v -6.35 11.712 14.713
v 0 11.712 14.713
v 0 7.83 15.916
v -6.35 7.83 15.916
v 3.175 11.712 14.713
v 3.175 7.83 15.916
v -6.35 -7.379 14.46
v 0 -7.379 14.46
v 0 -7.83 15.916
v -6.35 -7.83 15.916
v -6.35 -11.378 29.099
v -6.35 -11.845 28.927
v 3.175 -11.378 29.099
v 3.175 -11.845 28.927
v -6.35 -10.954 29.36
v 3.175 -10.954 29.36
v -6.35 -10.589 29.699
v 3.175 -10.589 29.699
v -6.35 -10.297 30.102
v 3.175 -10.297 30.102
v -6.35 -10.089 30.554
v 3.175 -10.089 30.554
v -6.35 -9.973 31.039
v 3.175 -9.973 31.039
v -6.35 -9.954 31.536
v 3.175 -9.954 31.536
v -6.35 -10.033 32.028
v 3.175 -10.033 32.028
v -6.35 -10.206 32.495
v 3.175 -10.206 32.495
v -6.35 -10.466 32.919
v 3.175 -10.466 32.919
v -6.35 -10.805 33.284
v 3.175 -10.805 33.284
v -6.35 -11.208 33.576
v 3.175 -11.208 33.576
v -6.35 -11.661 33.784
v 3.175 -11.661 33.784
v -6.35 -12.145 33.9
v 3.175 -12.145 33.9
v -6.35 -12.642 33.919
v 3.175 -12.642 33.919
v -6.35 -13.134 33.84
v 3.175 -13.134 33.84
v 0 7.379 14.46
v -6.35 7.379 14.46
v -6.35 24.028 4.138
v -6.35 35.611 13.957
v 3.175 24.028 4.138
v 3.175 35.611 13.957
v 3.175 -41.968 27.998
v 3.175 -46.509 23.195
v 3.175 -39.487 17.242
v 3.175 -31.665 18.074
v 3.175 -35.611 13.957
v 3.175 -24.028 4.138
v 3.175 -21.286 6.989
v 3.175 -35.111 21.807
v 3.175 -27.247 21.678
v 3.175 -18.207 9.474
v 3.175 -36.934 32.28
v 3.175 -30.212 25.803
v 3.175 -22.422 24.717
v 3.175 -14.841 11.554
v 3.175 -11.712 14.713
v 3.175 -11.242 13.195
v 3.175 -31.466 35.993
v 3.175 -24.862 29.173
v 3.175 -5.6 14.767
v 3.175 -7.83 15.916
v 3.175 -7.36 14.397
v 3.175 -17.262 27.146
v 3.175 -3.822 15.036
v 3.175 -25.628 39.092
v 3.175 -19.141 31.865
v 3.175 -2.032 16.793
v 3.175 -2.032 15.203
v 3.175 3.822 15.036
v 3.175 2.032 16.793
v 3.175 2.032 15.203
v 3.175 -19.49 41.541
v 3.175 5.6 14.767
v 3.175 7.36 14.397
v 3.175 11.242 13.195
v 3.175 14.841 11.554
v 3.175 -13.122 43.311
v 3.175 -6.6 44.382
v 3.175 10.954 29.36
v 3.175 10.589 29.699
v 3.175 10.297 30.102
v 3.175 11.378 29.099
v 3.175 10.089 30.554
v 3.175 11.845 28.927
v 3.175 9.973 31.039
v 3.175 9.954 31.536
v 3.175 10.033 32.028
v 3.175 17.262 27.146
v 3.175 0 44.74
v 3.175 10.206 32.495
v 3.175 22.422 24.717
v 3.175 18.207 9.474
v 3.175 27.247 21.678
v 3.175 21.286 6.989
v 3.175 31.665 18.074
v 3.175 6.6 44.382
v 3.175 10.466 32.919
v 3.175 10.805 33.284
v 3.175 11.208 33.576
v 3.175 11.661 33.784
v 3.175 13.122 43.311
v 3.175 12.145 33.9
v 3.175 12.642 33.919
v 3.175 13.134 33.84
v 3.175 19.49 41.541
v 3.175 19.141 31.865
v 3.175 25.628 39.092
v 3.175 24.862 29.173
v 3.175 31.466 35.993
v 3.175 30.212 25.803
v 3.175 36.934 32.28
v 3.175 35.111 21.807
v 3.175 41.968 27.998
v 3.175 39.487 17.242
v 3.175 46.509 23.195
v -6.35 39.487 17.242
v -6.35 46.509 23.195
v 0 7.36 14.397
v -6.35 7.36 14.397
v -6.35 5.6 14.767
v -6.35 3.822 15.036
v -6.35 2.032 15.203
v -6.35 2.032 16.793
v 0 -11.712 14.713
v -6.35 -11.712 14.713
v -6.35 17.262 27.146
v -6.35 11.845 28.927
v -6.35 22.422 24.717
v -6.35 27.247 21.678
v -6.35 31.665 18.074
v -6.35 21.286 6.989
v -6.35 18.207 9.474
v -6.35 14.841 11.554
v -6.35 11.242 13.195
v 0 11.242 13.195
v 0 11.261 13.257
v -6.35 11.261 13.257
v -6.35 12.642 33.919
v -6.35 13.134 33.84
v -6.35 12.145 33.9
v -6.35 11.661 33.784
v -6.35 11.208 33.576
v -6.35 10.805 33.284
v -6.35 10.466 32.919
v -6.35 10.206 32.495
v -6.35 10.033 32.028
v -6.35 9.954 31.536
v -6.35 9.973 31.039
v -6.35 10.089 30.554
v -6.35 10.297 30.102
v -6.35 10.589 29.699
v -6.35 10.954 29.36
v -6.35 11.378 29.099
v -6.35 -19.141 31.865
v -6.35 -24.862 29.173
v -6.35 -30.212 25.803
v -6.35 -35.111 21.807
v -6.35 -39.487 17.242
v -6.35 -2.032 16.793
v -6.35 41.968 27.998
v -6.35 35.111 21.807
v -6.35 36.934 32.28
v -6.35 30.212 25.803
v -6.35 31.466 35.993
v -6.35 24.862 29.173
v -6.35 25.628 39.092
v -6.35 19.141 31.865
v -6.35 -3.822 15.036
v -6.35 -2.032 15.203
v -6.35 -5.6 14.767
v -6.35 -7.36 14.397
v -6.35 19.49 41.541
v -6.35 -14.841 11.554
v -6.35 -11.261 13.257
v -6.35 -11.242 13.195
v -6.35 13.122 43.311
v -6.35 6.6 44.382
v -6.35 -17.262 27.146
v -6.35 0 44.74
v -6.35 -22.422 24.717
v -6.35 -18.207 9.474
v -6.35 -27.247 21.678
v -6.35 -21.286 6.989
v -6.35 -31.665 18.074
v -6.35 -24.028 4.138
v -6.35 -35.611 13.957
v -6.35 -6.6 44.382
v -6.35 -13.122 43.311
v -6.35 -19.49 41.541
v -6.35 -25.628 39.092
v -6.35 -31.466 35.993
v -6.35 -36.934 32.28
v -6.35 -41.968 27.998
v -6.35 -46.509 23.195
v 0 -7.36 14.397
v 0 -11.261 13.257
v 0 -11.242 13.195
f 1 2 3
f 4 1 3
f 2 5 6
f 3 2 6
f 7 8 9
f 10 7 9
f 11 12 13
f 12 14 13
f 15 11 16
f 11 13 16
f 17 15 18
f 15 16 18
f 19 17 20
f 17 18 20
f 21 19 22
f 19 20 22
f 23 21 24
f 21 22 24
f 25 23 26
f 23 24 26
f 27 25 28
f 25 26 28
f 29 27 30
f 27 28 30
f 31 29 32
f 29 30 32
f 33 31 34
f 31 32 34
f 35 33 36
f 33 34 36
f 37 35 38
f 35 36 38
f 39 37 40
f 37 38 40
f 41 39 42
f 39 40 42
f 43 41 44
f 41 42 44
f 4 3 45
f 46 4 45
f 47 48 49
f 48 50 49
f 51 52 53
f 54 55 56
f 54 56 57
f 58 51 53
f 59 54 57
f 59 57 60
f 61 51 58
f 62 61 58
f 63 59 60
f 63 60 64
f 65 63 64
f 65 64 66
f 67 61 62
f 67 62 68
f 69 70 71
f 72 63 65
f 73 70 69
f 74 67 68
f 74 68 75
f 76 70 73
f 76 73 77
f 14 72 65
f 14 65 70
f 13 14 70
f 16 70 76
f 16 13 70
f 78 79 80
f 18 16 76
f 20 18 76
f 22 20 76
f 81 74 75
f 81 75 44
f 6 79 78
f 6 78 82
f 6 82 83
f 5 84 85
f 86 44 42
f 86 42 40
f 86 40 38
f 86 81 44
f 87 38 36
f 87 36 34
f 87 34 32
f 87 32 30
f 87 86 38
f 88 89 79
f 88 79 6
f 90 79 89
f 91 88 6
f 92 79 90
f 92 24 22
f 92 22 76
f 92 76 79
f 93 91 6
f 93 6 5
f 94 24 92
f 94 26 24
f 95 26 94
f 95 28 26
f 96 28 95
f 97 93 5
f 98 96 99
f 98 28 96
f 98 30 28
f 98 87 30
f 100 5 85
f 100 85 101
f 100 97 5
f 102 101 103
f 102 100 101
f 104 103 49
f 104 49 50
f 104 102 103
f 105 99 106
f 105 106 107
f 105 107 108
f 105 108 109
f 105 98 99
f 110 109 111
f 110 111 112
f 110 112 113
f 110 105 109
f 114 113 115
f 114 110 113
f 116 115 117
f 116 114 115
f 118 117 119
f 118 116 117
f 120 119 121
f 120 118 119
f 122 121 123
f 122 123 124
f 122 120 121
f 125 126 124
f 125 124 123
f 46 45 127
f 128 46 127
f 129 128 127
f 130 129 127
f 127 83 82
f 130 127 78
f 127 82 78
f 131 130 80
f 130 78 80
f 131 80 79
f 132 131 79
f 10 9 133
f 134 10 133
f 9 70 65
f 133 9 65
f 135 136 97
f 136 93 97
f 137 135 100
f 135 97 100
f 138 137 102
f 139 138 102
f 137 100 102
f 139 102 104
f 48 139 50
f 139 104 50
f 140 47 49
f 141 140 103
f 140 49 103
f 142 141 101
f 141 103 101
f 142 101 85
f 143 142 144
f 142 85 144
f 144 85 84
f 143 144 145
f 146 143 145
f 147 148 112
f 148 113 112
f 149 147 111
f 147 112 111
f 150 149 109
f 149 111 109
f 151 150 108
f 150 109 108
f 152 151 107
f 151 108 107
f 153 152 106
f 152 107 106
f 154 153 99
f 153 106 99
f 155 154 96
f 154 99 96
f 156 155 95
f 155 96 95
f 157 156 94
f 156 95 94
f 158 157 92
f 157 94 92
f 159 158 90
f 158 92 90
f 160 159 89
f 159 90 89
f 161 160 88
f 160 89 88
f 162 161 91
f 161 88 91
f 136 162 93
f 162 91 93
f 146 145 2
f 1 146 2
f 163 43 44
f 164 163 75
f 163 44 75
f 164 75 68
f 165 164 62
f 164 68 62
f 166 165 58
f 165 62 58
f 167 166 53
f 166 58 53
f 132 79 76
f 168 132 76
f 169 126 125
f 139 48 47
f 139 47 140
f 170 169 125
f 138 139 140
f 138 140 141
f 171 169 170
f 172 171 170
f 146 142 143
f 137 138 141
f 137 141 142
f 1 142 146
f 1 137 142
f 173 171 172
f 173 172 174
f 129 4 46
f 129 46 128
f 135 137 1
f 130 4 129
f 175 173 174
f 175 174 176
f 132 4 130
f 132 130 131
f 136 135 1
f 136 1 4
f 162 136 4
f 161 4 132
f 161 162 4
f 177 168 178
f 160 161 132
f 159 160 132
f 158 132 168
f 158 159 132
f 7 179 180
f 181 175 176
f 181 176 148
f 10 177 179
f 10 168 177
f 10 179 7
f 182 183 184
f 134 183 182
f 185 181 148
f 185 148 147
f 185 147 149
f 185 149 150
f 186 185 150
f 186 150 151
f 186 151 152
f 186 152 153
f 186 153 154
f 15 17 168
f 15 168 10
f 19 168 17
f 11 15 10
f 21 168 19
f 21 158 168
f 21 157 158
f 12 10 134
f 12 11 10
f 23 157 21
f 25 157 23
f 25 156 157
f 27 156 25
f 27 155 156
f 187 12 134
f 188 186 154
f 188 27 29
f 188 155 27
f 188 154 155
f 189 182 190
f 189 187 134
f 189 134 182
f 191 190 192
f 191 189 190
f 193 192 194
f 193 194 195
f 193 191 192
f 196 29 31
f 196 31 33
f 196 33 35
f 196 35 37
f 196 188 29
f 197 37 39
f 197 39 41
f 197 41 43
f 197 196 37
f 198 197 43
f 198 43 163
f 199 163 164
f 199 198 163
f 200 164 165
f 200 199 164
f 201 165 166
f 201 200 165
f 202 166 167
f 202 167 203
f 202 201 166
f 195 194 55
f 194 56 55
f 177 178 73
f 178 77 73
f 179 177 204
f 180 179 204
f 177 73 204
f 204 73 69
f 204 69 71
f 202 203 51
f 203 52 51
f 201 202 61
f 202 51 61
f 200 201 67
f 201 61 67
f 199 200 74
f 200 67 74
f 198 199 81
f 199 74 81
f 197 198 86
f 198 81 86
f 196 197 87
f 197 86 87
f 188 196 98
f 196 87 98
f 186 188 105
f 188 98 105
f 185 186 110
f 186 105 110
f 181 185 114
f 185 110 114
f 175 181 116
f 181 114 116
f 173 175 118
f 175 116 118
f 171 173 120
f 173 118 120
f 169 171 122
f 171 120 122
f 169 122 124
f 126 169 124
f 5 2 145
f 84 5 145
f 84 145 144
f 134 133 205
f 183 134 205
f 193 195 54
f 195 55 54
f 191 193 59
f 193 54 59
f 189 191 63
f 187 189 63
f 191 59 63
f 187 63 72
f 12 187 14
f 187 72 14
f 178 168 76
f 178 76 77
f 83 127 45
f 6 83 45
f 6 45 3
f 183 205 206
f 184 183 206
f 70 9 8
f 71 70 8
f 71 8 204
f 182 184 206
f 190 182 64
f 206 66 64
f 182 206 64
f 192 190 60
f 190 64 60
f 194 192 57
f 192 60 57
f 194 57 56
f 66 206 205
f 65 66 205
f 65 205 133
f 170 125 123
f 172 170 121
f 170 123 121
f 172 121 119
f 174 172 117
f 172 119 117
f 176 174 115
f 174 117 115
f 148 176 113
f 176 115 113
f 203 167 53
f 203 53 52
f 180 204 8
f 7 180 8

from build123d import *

# Parameters (mm, degrees)
F1_DEPTH = 3.175
F3_DEPTH = 6.35


with BuildPart() as f1:
    # F0 (on Right) → F1 (new body)
    with BuildSketch(Plane.YZ):
        with BuildLine():
            ThreePointArc((11.2416642137, 13.194756409), (18.2070674879, 9.4741128861), (24.0282094439, 4.1379778313))
            Line((24.0282094439, 4.1379778313), (35.6114845565, 13.9572464754))
            ThreePointArc((35.6114845565, 13.9572464754), (24.8807782287, 23.2715946139), (11.8451676598, 28.9265036877))
            ThreePointArc((11.8451676598, 28.9265036877), (10.0327447326, 32.0278458379), (13.1340868829, 33.8402687651))
            ThreePointArc((13.1340868829, 33.8402687651), (27.588153444, 27.5700268215), (39.4865100795, 17.2421478736))
            Line((39.4865100795, 17.2421478736), (46.5087493001, 23.1949766478))
            ThreePointArc((46.5087493001, 23.1949766478), (0, 44.7400710849), (-46.5087493001, 23.1949766478))
            Line((-46.5087493001, 23.1949766478), (-39.4865100795, 17.2421478736))
            ThreePointArc((-39.4865100795, 17.2421478736), (-27.588153444, 27.5700268215), (-13.1340868829, 33.8402687651))
            ThreePointArc((-13.1340868829, 33.8402687651), (-10.0327447326, 32.0278458379), (-11.8451676598, 28.9265036877))
            ThreePointArc((-11.8451676598, 28.9265036877), (-24.8807782287, 23.2715946139), (-35.6114845565, 13.9572464754))
            Line((-35.6114845565, 13.9572464754), (-24.0282094439, 4.1379778313))
            ThreePointArc((-24.0282094439, 4.1379778313), (-18.2070674879, 9.4741128861), (-11.2416642137, 13.194756409))
            Line((-11.2416642137, 13.194756409), (-11.7119892349, 14.7131928424))
            Line((-11.7119892349, 14.7131928424), (-7.8299477766, 15.9156279202))
            Line((-7.8299477766, 15.9156279202), (-7.3596227555, 14.3971914867))
            ThreePointArc((-7.3596227555, 14.3971914867), (-4.7130812866, 14.9144174535), (-2.032, 15.2033942376))
            Line((-2.032, 15.2033942376), (-2.032, 16.7930026258))
            Line((-2.032, 16.7930026258), (2.032, 16.7930026258))
            Line((2.032, 16.7930026258), (2.032, 15.2033942376))
            ThreePointArc((2.032, 15.2033942376), (4.7130812866, 14.9144174535), (7.3596227555, 14.3971914867))
            Line((7.3596227555, 14.3971914867), (7.8299477766, 15.9156279202))
            Line((7.8299477766, 15.9156279202), (11.7119892349, 14.7131928424))
            Line((11.7119892349, 14.7131928424), (11.2416642137, 13.194756409))
        make_face()
    extrude(amount=F1_DEPTH)

    # F2 (on face) → F3 (join)
    with BuildSketch(Plane(origin=(0, 0, 0), x_dir=(0, -1, 0), z_dir=(-1, 0, 0))):
        with BuildLine():
            Line((-2.032, 16.7930026258), (2.032, 16.7930026258))
            Line((2.032, 16.7930026258), (2.032, 15.2690026258))
            Line((2.032, 15.2690026258), (2.032, 15.2033942376))
            ThreePointArc((2.032, 15.2033942376), (4.7130812866, 14.9144174535), (7.3596227555, 14.3971914867))
            Line((7.3596227555, 14.3971914867), (7.3790346224, 14.4598623733))
            Line((7.3790346224, 14.4598623733), (7.8299477766, 15.9156279202))
            Line((7.8299477766, 15.9156279202), (11.7119892349, 14.7131928424))
            Line((11.7119892349, 14.7131928424), (11.2610760807, 13.2574272956))
            Line((11.2610760807, 13.2574272956), (11.2416642137, 13.194756409))
            ThreePointArc((11.2416642137, 13.194756409), (18.2070674879, 9.4741128861), (24.0282094439, 4.1379778313))
            Line((24.0282094439, 4.1379778313), (35.6114845565, 13.9572464754))
            ThreePointArc((35.6114845565, 13.9572464754), (24.8807782287, 23.2715946139), (11.8451676598, 28.9265036877))
            ThreePointArc((11.8451676598, 28.9265036877), (10.0327447326, 32.0278458379), (13.1340868829, 33.8402687651))
            ThreePointArc((13.1340868829, 33.8402687651), (27.588153444, 27.5700268215), (39.4865100795, 17.2421478736))
            Line((39.4865100795, 17.2421478736), (46.5087493001, 23.1949766478))
            ThreePointArc((46.5087493001, 23.1949766478), (0, 44.7400710849), (-46.5087493001, 23.1949766478))
            Line((-46.5087493001, 23.1949766478), (-39.4865100795, 17.2421478736))
            ThreePointArc((-39.4865100795, 17.2421478736), (-27.588153444, 27.5700268215), (-13.1340868829, 33.8402687651))
            ThreePointArc((-13.1340868829, 33.8402687651), (-10.0327447326, 32.0278458379), (-11.8451676598, 28.9265036877))
            ThreePointArc((-11.8451676598, 28.9265036877), (-24.8807782287, 23.2715946139), (-35.6114845565, 13.9572464754))
            Line((-35.6114845565, 13.9572464754), (-24.0282094439, 4.1379778313))
            ThreePointArc((-24.0282094439, 4.1379778313), (-18.2070674879, 9.4741128861), (-11.2416642137, 13.194756409))
            Line((-11.2416642137, 13.194756409), (-11.2610760807, 13.2574272956))
            Line((-11.2610760807, 13.2574272956), (-11.7119892349, 14.7131928424))
            Line((-11.7119892349, 14.7131928424), (-7.8299477766, 15.9156279202))
            Line((-7.8299477766, 15.9156279202), (-7.3790346224, 14.4598623733))
            Line((-7.3790346224, 14.4598623733), (-7.3596227555, 14.3971914867))
            ThreePointArc((-7.3596227555, 14.3971914867), (-4.7130812866, 14.9144174535), (-2.032, 15.2033942376))
            Line((-2.032, 15.2033942376), (-2.032, 15.2690026258))
            Line((-2.032, 15.2690026258), (-2.032, 16.7930026258))
        make_face()
    extrude(amount=F3_DEPTH)


solid = f1.part
